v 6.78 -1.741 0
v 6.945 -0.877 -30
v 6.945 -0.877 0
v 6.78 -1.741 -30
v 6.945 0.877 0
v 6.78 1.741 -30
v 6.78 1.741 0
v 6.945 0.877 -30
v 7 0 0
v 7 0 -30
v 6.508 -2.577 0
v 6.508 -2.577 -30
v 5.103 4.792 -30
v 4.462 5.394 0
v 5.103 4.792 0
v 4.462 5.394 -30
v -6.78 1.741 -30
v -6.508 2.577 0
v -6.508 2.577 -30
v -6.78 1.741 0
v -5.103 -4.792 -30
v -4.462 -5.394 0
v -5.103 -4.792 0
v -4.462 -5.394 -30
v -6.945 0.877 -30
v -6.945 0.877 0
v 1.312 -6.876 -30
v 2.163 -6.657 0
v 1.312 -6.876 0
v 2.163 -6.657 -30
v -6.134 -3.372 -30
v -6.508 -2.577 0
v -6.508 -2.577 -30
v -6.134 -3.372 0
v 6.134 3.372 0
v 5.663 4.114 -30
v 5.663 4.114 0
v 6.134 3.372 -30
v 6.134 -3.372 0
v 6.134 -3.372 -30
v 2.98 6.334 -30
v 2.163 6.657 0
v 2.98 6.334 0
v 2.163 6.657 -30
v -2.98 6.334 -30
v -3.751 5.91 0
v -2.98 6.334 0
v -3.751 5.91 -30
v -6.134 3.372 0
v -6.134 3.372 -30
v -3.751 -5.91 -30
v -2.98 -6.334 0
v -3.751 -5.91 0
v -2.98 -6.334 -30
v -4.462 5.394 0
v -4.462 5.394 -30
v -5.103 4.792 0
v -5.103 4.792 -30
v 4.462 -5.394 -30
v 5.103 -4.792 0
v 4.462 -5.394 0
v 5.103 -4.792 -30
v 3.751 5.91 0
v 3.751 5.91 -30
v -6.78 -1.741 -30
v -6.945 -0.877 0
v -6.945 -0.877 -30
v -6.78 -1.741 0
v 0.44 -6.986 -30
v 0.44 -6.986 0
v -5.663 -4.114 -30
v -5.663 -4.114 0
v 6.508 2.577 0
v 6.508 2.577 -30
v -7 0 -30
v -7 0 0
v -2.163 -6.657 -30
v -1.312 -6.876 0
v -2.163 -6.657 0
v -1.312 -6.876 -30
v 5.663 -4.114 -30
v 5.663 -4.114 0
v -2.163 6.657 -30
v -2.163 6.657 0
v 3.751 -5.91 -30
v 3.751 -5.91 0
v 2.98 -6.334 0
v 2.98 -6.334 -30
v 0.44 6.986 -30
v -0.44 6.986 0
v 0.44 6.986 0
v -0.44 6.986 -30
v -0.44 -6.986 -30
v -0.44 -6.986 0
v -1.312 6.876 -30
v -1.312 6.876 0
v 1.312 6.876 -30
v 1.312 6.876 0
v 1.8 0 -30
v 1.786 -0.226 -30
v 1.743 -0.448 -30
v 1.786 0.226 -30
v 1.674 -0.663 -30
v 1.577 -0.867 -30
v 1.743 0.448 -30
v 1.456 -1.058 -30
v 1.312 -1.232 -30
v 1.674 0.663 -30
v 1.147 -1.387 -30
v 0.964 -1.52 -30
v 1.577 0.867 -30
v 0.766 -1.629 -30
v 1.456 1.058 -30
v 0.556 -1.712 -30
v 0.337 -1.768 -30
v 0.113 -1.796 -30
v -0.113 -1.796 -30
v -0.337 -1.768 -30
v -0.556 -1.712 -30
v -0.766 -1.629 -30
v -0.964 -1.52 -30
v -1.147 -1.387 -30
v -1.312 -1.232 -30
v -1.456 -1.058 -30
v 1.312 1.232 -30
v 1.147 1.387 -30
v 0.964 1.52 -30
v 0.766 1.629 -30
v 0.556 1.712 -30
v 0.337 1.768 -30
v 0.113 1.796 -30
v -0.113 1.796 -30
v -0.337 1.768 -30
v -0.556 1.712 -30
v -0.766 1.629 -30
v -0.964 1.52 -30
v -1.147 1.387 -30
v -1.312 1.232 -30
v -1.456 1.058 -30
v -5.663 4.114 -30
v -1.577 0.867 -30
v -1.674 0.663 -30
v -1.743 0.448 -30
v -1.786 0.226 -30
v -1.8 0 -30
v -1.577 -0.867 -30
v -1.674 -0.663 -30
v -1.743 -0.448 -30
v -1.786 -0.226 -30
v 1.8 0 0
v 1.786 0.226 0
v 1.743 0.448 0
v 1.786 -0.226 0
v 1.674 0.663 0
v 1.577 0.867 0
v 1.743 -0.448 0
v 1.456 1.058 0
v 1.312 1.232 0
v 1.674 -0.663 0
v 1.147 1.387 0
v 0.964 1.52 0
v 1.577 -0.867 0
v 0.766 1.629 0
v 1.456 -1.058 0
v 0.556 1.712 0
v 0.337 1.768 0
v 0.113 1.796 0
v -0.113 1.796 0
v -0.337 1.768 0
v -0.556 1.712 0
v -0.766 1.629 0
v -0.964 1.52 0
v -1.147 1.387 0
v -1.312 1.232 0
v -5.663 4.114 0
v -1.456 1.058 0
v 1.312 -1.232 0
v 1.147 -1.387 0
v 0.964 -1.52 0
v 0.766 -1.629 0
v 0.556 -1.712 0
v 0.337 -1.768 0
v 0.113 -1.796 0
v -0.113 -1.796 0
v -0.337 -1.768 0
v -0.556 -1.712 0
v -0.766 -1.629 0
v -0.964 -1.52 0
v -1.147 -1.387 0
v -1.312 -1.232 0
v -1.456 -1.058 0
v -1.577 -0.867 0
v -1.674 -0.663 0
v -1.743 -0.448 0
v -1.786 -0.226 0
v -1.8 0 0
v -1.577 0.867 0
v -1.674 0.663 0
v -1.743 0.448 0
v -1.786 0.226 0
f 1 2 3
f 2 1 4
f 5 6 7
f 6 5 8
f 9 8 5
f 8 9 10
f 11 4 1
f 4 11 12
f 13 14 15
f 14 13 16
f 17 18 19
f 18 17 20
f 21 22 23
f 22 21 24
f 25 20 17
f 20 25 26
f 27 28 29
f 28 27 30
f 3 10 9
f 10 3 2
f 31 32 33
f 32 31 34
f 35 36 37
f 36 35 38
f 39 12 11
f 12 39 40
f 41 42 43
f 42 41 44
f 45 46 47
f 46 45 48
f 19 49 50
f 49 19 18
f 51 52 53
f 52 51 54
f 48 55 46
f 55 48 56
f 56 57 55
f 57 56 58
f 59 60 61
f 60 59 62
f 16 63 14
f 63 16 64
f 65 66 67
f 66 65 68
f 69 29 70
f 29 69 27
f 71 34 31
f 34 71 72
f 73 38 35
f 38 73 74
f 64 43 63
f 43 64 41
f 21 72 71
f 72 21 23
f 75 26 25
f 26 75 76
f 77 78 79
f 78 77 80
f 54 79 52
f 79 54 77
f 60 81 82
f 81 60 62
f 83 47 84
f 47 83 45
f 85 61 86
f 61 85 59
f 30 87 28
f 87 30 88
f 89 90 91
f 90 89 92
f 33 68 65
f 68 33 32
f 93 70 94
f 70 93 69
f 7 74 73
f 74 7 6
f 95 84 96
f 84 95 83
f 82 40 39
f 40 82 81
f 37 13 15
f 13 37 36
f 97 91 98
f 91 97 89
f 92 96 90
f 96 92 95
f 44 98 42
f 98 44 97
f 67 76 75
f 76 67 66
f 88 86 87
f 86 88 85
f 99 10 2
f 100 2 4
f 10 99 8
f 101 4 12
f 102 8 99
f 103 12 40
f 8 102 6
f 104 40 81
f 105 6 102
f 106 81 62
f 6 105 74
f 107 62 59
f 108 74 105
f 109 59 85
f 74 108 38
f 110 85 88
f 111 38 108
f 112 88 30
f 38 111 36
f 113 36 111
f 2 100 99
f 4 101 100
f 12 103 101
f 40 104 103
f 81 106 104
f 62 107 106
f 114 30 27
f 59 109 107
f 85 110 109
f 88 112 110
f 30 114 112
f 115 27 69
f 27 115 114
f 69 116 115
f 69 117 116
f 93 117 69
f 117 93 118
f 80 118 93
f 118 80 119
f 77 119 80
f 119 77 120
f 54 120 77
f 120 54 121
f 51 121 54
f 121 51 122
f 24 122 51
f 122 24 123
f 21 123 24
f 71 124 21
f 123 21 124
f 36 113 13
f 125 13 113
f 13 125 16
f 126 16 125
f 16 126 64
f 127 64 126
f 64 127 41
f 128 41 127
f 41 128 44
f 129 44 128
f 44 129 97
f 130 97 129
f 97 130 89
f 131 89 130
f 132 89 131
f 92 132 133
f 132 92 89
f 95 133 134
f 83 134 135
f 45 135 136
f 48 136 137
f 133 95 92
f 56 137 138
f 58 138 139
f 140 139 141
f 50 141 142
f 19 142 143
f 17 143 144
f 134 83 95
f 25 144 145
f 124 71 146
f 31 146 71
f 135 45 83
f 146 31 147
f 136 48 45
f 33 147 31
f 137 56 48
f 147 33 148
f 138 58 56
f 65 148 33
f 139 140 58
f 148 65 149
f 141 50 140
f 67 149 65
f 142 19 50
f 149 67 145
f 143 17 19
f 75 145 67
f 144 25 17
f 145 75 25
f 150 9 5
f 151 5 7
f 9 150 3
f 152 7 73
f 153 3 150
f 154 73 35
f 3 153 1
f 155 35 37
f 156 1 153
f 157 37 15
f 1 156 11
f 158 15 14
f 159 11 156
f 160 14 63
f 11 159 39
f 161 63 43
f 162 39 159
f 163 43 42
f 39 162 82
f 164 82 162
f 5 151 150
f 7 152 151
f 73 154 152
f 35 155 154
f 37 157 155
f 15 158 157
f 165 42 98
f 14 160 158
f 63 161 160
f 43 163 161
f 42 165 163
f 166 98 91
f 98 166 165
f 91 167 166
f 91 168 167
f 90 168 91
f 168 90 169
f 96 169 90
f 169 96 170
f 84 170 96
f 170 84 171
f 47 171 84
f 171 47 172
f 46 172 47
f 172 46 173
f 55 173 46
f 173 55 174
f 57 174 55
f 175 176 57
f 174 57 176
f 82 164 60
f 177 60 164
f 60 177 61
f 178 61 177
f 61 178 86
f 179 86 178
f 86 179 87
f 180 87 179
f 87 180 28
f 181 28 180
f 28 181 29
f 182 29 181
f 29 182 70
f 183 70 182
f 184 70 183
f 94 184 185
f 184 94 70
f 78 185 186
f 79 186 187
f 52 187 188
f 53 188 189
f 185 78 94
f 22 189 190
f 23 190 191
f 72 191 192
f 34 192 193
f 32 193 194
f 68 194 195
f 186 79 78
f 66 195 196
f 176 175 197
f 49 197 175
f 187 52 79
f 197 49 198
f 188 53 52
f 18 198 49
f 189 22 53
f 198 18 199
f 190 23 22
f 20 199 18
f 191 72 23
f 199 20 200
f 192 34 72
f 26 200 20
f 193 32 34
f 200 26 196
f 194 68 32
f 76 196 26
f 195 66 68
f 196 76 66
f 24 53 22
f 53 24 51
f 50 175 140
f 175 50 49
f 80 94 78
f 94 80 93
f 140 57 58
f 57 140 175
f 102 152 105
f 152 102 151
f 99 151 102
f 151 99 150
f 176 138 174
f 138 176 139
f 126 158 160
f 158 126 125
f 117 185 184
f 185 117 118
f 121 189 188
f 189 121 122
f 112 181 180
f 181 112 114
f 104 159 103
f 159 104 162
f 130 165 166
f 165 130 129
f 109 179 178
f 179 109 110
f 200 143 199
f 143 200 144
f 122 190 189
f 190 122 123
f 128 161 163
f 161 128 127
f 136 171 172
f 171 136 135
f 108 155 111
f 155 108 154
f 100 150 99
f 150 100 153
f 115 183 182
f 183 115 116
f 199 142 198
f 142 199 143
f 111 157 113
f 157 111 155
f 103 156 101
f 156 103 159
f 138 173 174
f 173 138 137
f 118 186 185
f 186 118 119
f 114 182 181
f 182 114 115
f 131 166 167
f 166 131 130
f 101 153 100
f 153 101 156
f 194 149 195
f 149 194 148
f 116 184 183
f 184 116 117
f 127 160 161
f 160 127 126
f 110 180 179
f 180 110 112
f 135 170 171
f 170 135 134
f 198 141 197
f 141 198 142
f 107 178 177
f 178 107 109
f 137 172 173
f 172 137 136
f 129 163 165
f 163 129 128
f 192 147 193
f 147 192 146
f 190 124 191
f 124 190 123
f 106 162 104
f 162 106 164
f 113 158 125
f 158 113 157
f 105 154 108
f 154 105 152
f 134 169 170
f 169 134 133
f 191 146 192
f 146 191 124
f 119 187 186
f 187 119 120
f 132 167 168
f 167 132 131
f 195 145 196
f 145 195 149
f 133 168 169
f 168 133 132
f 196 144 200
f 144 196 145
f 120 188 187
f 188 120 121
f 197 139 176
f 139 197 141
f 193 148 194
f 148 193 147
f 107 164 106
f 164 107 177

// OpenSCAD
$fn = 50;


difference() {
	union() {
		translate(v = [0, 0, -30.0000000000]) {
			cylinder(h = 30, r = 7.0000000000);
		}
		cylinder(h = 0, r = 17.0000000000);
	}
	union() {
		#translate(v = [0, 0, -30]) {
			cylinder(h = 30, r = 1.8000000000);
		}
	}
}
